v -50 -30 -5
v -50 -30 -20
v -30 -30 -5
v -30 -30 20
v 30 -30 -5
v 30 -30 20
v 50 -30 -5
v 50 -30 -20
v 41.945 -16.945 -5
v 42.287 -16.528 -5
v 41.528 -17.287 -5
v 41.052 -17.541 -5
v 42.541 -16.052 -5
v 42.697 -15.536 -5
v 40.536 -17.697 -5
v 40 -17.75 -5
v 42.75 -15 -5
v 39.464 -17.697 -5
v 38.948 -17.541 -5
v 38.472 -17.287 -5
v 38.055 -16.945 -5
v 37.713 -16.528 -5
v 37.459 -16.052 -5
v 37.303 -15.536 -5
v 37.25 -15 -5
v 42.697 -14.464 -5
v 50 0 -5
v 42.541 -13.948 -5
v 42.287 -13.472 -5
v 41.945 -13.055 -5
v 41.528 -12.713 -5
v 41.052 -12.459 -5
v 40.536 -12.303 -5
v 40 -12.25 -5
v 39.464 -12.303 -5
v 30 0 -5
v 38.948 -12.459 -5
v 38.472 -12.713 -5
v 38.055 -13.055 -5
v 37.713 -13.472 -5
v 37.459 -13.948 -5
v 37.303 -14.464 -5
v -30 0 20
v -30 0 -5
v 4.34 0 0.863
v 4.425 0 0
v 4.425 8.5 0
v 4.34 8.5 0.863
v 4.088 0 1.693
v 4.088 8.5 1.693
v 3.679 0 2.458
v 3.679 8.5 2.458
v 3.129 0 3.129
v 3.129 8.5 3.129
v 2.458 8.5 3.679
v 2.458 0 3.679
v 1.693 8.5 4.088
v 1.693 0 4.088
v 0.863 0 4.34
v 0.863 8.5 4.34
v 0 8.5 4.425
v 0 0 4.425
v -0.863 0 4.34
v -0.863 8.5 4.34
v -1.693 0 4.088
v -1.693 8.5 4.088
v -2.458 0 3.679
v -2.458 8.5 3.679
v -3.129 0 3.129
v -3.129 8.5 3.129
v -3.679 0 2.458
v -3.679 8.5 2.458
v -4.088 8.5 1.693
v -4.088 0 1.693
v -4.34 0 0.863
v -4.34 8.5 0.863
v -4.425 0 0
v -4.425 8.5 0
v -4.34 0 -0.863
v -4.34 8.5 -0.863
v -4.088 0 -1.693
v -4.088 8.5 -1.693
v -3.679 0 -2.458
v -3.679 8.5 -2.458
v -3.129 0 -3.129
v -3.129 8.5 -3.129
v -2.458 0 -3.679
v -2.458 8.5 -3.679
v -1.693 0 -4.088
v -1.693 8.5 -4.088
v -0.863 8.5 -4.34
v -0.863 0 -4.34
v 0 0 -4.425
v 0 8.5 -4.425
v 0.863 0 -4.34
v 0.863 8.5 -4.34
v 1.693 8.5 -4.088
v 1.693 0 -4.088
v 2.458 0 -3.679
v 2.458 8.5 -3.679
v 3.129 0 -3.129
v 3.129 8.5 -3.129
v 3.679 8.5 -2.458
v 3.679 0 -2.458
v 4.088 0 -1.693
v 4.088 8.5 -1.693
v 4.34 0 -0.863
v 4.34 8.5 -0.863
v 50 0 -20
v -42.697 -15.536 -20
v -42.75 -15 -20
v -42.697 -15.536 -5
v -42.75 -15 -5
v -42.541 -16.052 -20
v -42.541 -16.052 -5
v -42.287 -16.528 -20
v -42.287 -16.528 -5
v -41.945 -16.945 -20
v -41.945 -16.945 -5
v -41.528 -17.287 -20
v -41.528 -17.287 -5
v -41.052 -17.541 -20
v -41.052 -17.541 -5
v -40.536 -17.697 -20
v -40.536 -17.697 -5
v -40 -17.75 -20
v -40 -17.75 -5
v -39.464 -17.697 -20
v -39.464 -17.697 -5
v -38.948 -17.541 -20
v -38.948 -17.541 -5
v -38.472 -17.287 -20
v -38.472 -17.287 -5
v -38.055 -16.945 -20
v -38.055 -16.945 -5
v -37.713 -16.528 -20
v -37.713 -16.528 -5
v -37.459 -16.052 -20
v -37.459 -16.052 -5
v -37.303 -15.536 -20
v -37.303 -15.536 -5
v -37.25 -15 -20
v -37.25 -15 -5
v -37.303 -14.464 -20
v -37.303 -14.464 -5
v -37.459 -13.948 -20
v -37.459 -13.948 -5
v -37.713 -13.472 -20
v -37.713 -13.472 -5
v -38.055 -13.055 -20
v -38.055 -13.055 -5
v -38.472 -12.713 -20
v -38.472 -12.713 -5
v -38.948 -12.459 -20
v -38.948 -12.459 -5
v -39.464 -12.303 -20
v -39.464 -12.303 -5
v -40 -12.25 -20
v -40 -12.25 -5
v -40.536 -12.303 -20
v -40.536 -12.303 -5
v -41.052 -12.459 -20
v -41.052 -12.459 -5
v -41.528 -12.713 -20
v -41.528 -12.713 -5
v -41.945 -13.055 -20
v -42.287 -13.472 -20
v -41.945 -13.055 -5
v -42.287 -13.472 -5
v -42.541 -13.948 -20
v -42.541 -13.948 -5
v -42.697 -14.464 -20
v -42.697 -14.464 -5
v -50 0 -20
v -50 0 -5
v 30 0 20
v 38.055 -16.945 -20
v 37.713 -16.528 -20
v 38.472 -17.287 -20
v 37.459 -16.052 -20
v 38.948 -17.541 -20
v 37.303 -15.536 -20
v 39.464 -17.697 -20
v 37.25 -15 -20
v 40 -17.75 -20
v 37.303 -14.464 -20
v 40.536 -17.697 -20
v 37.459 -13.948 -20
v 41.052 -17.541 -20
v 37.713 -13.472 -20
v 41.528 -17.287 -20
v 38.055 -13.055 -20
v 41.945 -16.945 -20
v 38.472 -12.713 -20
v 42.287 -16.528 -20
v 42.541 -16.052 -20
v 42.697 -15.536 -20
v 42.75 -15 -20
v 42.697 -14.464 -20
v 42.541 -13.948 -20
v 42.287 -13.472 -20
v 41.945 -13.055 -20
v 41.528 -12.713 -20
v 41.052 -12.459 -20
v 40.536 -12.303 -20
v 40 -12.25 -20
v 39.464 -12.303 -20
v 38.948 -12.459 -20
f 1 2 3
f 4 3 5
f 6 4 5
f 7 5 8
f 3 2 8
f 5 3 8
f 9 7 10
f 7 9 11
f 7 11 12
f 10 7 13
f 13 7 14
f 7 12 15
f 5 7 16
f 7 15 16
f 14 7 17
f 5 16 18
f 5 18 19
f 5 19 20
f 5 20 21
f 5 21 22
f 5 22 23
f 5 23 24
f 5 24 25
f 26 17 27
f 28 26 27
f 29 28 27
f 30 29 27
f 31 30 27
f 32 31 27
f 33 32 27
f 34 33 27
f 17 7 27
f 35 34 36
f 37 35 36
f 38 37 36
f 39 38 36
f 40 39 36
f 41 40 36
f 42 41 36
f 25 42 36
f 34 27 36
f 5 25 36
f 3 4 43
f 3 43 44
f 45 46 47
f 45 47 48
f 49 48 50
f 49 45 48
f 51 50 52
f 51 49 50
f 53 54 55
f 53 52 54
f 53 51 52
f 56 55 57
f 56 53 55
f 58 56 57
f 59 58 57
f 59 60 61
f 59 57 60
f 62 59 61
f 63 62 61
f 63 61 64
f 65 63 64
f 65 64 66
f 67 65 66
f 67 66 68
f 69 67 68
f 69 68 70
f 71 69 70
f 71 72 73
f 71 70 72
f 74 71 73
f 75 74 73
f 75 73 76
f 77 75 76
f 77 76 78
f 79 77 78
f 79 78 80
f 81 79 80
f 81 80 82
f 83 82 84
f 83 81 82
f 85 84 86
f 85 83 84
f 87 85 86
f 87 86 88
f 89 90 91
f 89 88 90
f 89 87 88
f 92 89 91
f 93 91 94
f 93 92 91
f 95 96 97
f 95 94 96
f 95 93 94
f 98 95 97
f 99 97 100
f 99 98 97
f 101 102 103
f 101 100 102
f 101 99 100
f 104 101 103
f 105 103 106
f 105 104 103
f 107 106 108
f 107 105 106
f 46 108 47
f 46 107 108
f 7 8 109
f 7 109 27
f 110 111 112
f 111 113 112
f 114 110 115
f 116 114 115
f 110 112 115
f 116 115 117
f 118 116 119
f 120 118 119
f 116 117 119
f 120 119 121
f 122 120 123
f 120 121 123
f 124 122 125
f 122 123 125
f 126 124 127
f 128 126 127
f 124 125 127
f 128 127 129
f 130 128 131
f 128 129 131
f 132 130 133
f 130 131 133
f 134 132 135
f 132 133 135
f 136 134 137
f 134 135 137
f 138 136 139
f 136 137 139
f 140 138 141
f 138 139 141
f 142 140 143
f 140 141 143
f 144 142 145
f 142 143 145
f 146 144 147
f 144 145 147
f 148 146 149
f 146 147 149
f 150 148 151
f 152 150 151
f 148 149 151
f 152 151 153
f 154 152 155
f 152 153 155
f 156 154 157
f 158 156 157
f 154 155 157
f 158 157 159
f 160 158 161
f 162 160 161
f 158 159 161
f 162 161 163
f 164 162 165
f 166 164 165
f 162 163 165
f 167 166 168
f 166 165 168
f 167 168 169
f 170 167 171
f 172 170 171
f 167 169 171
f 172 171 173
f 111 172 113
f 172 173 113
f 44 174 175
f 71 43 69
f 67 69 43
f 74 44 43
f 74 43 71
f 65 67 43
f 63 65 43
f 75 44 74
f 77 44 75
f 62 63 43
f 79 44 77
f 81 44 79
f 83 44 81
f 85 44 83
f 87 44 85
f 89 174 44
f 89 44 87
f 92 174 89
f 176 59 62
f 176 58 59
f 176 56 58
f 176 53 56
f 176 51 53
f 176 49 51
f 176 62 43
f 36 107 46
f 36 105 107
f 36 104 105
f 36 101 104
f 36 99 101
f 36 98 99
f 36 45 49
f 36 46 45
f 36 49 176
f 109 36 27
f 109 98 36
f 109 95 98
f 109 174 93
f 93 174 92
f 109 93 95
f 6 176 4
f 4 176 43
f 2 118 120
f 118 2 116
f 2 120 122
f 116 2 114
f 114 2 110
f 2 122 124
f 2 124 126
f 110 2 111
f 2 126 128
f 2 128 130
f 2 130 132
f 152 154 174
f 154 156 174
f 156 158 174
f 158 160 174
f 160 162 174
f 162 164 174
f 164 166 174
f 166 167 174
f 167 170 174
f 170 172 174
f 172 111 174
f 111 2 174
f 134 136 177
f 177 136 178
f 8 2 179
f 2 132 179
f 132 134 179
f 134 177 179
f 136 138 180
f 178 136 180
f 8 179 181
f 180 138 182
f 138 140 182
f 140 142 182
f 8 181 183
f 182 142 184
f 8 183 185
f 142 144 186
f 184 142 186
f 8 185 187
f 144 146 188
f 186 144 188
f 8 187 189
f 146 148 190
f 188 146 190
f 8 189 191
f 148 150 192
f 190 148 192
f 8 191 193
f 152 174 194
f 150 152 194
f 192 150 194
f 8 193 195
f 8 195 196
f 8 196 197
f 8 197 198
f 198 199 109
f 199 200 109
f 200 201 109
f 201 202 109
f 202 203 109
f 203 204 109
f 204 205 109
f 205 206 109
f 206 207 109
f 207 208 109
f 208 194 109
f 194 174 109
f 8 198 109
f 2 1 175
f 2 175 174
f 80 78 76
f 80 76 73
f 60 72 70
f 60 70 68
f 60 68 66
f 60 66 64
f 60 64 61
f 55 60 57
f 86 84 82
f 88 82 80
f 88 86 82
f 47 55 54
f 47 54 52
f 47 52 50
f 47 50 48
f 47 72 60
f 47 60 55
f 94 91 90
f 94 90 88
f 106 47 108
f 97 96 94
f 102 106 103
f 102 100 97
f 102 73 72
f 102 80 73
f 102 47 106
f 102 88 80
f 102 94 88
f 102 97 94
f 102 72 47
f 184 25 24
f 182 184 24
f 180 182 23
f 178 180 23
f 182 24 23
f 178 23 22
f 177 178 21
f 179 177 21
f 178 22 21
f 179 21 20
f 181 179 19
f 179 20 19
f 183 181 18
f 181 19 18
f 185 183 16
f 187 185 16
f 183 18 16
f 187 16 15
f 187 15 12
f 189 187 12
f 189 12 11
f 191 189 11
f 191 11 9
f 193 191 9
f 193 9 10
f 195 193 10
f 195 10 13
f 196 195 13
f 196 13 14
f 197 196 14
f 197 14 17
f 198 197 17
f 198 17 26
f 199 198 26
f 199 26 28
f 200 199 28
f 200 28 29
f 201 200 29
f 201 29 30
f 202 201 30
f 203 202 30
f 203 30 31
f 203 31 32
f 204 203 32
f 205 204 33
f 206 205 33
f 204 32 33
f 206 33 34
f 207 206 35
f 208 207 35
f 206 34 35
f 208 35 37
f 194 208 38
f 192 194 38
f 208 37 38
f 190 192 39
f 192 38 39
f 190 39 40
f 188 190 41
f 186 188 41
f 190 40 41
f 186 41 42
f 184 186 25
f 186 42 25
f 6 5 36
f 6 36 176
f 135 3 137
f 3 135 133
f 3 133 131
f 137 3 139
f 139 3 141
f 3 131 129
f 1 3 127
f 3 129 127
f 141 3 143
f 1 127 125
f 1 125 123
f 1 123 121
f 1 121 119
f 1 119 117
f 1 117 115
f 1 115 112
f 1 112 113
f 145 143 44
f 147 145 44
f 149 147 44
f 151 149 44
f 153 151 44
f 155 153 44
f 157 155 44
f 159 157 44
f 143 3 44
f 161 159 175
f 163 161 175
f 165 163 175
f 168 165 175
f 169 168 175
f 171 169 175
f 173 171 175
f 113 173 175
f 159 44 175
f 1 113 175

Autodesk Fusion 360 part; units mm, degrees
sketch "main" plane through (0, 0, 0) normal (0, 1, 0) x (1, 0, 0) in component "crank-holder"
  line L0 (30, -20) -> (-30, -20)
  line L1 (-30, -20) -> (-30, 20)
  line L2 (-30, 20) -> (30, 20)
  line L3 (30, 20) -> (30, -20)
  line L4 (30, -20) -> (-30, 20) construction
  line L5 (-30, -20) -> (30, 20) construction
  circle A0 centre (0, 0) radius 4.425
  line L6 (-30, 20) -> (-50, 20) construction
  line L7 (-50, 20) -> (50, 20)
  line L8 (50, 20) -> (50, 5)
  line L9 (50, 5) -> (-50, 5)
  line L10 (-50, 5) -> (-50, 20)
  dimension "d1" = 60
  dimension "d2" = 40
  dimension "d3" = 8.85
  dimension "d4" = 20
  dimension "d5" = 100
  dimension "d6" = 15
extrude "Extrude1" add sketch "main" against normal blind 30 contours L0 L1 L3 L9 | L1 L2 L3 L7 L9 | L3 L7 L8 L9 | L1 L7 L9 L10 | A0 in component "crank-holder"
extrude "Extrude2" add sketch "main" along normal blind 8.5 contours A0 in component "crank-holder"
sketch "screws" plane through (0, 0, -5) normal (0, 0, 1) x (-1, 0, 0) in component "crank-holder"
  line L0 (30, 0) -> (50, 0)
  line L1 (50, 0) -> (50, 30)
  line L2 (50, 30) -> (30, 30)
  line L3 (30, 30) -> (30, 0)
  line L4 (50, 0) -> (30, 30) construction
  line L5 (50, 30) -> (30, 0) construction
  line L6 (-50, 0) -> (-30, 30) construction
  line L7 (-50, 30) -> (-30, 0) construction
  circle A0 centre (40, 15) radius 2.75
  circle A1 centre (-40, 15) radius 2.75
  point P0 (-50, 0)
  point P1 (-30, 30)
  point P2 (-50, 30)
  point P3 (-30, 0)
  dimension "d11" = 5.5
  dimension "d12" = 5.5
extrude "Extrude3" cut sketch "screws" against normal blind 15 contours A0 | A1 in component "crank-holder"
component "crank-holder" placed x (1, 0, 0) y (0, 1, 0) z (0, 0, 1) at (0, 0, 0)
equation "d5 = 20 mm + 60 mm + 20 mm"
